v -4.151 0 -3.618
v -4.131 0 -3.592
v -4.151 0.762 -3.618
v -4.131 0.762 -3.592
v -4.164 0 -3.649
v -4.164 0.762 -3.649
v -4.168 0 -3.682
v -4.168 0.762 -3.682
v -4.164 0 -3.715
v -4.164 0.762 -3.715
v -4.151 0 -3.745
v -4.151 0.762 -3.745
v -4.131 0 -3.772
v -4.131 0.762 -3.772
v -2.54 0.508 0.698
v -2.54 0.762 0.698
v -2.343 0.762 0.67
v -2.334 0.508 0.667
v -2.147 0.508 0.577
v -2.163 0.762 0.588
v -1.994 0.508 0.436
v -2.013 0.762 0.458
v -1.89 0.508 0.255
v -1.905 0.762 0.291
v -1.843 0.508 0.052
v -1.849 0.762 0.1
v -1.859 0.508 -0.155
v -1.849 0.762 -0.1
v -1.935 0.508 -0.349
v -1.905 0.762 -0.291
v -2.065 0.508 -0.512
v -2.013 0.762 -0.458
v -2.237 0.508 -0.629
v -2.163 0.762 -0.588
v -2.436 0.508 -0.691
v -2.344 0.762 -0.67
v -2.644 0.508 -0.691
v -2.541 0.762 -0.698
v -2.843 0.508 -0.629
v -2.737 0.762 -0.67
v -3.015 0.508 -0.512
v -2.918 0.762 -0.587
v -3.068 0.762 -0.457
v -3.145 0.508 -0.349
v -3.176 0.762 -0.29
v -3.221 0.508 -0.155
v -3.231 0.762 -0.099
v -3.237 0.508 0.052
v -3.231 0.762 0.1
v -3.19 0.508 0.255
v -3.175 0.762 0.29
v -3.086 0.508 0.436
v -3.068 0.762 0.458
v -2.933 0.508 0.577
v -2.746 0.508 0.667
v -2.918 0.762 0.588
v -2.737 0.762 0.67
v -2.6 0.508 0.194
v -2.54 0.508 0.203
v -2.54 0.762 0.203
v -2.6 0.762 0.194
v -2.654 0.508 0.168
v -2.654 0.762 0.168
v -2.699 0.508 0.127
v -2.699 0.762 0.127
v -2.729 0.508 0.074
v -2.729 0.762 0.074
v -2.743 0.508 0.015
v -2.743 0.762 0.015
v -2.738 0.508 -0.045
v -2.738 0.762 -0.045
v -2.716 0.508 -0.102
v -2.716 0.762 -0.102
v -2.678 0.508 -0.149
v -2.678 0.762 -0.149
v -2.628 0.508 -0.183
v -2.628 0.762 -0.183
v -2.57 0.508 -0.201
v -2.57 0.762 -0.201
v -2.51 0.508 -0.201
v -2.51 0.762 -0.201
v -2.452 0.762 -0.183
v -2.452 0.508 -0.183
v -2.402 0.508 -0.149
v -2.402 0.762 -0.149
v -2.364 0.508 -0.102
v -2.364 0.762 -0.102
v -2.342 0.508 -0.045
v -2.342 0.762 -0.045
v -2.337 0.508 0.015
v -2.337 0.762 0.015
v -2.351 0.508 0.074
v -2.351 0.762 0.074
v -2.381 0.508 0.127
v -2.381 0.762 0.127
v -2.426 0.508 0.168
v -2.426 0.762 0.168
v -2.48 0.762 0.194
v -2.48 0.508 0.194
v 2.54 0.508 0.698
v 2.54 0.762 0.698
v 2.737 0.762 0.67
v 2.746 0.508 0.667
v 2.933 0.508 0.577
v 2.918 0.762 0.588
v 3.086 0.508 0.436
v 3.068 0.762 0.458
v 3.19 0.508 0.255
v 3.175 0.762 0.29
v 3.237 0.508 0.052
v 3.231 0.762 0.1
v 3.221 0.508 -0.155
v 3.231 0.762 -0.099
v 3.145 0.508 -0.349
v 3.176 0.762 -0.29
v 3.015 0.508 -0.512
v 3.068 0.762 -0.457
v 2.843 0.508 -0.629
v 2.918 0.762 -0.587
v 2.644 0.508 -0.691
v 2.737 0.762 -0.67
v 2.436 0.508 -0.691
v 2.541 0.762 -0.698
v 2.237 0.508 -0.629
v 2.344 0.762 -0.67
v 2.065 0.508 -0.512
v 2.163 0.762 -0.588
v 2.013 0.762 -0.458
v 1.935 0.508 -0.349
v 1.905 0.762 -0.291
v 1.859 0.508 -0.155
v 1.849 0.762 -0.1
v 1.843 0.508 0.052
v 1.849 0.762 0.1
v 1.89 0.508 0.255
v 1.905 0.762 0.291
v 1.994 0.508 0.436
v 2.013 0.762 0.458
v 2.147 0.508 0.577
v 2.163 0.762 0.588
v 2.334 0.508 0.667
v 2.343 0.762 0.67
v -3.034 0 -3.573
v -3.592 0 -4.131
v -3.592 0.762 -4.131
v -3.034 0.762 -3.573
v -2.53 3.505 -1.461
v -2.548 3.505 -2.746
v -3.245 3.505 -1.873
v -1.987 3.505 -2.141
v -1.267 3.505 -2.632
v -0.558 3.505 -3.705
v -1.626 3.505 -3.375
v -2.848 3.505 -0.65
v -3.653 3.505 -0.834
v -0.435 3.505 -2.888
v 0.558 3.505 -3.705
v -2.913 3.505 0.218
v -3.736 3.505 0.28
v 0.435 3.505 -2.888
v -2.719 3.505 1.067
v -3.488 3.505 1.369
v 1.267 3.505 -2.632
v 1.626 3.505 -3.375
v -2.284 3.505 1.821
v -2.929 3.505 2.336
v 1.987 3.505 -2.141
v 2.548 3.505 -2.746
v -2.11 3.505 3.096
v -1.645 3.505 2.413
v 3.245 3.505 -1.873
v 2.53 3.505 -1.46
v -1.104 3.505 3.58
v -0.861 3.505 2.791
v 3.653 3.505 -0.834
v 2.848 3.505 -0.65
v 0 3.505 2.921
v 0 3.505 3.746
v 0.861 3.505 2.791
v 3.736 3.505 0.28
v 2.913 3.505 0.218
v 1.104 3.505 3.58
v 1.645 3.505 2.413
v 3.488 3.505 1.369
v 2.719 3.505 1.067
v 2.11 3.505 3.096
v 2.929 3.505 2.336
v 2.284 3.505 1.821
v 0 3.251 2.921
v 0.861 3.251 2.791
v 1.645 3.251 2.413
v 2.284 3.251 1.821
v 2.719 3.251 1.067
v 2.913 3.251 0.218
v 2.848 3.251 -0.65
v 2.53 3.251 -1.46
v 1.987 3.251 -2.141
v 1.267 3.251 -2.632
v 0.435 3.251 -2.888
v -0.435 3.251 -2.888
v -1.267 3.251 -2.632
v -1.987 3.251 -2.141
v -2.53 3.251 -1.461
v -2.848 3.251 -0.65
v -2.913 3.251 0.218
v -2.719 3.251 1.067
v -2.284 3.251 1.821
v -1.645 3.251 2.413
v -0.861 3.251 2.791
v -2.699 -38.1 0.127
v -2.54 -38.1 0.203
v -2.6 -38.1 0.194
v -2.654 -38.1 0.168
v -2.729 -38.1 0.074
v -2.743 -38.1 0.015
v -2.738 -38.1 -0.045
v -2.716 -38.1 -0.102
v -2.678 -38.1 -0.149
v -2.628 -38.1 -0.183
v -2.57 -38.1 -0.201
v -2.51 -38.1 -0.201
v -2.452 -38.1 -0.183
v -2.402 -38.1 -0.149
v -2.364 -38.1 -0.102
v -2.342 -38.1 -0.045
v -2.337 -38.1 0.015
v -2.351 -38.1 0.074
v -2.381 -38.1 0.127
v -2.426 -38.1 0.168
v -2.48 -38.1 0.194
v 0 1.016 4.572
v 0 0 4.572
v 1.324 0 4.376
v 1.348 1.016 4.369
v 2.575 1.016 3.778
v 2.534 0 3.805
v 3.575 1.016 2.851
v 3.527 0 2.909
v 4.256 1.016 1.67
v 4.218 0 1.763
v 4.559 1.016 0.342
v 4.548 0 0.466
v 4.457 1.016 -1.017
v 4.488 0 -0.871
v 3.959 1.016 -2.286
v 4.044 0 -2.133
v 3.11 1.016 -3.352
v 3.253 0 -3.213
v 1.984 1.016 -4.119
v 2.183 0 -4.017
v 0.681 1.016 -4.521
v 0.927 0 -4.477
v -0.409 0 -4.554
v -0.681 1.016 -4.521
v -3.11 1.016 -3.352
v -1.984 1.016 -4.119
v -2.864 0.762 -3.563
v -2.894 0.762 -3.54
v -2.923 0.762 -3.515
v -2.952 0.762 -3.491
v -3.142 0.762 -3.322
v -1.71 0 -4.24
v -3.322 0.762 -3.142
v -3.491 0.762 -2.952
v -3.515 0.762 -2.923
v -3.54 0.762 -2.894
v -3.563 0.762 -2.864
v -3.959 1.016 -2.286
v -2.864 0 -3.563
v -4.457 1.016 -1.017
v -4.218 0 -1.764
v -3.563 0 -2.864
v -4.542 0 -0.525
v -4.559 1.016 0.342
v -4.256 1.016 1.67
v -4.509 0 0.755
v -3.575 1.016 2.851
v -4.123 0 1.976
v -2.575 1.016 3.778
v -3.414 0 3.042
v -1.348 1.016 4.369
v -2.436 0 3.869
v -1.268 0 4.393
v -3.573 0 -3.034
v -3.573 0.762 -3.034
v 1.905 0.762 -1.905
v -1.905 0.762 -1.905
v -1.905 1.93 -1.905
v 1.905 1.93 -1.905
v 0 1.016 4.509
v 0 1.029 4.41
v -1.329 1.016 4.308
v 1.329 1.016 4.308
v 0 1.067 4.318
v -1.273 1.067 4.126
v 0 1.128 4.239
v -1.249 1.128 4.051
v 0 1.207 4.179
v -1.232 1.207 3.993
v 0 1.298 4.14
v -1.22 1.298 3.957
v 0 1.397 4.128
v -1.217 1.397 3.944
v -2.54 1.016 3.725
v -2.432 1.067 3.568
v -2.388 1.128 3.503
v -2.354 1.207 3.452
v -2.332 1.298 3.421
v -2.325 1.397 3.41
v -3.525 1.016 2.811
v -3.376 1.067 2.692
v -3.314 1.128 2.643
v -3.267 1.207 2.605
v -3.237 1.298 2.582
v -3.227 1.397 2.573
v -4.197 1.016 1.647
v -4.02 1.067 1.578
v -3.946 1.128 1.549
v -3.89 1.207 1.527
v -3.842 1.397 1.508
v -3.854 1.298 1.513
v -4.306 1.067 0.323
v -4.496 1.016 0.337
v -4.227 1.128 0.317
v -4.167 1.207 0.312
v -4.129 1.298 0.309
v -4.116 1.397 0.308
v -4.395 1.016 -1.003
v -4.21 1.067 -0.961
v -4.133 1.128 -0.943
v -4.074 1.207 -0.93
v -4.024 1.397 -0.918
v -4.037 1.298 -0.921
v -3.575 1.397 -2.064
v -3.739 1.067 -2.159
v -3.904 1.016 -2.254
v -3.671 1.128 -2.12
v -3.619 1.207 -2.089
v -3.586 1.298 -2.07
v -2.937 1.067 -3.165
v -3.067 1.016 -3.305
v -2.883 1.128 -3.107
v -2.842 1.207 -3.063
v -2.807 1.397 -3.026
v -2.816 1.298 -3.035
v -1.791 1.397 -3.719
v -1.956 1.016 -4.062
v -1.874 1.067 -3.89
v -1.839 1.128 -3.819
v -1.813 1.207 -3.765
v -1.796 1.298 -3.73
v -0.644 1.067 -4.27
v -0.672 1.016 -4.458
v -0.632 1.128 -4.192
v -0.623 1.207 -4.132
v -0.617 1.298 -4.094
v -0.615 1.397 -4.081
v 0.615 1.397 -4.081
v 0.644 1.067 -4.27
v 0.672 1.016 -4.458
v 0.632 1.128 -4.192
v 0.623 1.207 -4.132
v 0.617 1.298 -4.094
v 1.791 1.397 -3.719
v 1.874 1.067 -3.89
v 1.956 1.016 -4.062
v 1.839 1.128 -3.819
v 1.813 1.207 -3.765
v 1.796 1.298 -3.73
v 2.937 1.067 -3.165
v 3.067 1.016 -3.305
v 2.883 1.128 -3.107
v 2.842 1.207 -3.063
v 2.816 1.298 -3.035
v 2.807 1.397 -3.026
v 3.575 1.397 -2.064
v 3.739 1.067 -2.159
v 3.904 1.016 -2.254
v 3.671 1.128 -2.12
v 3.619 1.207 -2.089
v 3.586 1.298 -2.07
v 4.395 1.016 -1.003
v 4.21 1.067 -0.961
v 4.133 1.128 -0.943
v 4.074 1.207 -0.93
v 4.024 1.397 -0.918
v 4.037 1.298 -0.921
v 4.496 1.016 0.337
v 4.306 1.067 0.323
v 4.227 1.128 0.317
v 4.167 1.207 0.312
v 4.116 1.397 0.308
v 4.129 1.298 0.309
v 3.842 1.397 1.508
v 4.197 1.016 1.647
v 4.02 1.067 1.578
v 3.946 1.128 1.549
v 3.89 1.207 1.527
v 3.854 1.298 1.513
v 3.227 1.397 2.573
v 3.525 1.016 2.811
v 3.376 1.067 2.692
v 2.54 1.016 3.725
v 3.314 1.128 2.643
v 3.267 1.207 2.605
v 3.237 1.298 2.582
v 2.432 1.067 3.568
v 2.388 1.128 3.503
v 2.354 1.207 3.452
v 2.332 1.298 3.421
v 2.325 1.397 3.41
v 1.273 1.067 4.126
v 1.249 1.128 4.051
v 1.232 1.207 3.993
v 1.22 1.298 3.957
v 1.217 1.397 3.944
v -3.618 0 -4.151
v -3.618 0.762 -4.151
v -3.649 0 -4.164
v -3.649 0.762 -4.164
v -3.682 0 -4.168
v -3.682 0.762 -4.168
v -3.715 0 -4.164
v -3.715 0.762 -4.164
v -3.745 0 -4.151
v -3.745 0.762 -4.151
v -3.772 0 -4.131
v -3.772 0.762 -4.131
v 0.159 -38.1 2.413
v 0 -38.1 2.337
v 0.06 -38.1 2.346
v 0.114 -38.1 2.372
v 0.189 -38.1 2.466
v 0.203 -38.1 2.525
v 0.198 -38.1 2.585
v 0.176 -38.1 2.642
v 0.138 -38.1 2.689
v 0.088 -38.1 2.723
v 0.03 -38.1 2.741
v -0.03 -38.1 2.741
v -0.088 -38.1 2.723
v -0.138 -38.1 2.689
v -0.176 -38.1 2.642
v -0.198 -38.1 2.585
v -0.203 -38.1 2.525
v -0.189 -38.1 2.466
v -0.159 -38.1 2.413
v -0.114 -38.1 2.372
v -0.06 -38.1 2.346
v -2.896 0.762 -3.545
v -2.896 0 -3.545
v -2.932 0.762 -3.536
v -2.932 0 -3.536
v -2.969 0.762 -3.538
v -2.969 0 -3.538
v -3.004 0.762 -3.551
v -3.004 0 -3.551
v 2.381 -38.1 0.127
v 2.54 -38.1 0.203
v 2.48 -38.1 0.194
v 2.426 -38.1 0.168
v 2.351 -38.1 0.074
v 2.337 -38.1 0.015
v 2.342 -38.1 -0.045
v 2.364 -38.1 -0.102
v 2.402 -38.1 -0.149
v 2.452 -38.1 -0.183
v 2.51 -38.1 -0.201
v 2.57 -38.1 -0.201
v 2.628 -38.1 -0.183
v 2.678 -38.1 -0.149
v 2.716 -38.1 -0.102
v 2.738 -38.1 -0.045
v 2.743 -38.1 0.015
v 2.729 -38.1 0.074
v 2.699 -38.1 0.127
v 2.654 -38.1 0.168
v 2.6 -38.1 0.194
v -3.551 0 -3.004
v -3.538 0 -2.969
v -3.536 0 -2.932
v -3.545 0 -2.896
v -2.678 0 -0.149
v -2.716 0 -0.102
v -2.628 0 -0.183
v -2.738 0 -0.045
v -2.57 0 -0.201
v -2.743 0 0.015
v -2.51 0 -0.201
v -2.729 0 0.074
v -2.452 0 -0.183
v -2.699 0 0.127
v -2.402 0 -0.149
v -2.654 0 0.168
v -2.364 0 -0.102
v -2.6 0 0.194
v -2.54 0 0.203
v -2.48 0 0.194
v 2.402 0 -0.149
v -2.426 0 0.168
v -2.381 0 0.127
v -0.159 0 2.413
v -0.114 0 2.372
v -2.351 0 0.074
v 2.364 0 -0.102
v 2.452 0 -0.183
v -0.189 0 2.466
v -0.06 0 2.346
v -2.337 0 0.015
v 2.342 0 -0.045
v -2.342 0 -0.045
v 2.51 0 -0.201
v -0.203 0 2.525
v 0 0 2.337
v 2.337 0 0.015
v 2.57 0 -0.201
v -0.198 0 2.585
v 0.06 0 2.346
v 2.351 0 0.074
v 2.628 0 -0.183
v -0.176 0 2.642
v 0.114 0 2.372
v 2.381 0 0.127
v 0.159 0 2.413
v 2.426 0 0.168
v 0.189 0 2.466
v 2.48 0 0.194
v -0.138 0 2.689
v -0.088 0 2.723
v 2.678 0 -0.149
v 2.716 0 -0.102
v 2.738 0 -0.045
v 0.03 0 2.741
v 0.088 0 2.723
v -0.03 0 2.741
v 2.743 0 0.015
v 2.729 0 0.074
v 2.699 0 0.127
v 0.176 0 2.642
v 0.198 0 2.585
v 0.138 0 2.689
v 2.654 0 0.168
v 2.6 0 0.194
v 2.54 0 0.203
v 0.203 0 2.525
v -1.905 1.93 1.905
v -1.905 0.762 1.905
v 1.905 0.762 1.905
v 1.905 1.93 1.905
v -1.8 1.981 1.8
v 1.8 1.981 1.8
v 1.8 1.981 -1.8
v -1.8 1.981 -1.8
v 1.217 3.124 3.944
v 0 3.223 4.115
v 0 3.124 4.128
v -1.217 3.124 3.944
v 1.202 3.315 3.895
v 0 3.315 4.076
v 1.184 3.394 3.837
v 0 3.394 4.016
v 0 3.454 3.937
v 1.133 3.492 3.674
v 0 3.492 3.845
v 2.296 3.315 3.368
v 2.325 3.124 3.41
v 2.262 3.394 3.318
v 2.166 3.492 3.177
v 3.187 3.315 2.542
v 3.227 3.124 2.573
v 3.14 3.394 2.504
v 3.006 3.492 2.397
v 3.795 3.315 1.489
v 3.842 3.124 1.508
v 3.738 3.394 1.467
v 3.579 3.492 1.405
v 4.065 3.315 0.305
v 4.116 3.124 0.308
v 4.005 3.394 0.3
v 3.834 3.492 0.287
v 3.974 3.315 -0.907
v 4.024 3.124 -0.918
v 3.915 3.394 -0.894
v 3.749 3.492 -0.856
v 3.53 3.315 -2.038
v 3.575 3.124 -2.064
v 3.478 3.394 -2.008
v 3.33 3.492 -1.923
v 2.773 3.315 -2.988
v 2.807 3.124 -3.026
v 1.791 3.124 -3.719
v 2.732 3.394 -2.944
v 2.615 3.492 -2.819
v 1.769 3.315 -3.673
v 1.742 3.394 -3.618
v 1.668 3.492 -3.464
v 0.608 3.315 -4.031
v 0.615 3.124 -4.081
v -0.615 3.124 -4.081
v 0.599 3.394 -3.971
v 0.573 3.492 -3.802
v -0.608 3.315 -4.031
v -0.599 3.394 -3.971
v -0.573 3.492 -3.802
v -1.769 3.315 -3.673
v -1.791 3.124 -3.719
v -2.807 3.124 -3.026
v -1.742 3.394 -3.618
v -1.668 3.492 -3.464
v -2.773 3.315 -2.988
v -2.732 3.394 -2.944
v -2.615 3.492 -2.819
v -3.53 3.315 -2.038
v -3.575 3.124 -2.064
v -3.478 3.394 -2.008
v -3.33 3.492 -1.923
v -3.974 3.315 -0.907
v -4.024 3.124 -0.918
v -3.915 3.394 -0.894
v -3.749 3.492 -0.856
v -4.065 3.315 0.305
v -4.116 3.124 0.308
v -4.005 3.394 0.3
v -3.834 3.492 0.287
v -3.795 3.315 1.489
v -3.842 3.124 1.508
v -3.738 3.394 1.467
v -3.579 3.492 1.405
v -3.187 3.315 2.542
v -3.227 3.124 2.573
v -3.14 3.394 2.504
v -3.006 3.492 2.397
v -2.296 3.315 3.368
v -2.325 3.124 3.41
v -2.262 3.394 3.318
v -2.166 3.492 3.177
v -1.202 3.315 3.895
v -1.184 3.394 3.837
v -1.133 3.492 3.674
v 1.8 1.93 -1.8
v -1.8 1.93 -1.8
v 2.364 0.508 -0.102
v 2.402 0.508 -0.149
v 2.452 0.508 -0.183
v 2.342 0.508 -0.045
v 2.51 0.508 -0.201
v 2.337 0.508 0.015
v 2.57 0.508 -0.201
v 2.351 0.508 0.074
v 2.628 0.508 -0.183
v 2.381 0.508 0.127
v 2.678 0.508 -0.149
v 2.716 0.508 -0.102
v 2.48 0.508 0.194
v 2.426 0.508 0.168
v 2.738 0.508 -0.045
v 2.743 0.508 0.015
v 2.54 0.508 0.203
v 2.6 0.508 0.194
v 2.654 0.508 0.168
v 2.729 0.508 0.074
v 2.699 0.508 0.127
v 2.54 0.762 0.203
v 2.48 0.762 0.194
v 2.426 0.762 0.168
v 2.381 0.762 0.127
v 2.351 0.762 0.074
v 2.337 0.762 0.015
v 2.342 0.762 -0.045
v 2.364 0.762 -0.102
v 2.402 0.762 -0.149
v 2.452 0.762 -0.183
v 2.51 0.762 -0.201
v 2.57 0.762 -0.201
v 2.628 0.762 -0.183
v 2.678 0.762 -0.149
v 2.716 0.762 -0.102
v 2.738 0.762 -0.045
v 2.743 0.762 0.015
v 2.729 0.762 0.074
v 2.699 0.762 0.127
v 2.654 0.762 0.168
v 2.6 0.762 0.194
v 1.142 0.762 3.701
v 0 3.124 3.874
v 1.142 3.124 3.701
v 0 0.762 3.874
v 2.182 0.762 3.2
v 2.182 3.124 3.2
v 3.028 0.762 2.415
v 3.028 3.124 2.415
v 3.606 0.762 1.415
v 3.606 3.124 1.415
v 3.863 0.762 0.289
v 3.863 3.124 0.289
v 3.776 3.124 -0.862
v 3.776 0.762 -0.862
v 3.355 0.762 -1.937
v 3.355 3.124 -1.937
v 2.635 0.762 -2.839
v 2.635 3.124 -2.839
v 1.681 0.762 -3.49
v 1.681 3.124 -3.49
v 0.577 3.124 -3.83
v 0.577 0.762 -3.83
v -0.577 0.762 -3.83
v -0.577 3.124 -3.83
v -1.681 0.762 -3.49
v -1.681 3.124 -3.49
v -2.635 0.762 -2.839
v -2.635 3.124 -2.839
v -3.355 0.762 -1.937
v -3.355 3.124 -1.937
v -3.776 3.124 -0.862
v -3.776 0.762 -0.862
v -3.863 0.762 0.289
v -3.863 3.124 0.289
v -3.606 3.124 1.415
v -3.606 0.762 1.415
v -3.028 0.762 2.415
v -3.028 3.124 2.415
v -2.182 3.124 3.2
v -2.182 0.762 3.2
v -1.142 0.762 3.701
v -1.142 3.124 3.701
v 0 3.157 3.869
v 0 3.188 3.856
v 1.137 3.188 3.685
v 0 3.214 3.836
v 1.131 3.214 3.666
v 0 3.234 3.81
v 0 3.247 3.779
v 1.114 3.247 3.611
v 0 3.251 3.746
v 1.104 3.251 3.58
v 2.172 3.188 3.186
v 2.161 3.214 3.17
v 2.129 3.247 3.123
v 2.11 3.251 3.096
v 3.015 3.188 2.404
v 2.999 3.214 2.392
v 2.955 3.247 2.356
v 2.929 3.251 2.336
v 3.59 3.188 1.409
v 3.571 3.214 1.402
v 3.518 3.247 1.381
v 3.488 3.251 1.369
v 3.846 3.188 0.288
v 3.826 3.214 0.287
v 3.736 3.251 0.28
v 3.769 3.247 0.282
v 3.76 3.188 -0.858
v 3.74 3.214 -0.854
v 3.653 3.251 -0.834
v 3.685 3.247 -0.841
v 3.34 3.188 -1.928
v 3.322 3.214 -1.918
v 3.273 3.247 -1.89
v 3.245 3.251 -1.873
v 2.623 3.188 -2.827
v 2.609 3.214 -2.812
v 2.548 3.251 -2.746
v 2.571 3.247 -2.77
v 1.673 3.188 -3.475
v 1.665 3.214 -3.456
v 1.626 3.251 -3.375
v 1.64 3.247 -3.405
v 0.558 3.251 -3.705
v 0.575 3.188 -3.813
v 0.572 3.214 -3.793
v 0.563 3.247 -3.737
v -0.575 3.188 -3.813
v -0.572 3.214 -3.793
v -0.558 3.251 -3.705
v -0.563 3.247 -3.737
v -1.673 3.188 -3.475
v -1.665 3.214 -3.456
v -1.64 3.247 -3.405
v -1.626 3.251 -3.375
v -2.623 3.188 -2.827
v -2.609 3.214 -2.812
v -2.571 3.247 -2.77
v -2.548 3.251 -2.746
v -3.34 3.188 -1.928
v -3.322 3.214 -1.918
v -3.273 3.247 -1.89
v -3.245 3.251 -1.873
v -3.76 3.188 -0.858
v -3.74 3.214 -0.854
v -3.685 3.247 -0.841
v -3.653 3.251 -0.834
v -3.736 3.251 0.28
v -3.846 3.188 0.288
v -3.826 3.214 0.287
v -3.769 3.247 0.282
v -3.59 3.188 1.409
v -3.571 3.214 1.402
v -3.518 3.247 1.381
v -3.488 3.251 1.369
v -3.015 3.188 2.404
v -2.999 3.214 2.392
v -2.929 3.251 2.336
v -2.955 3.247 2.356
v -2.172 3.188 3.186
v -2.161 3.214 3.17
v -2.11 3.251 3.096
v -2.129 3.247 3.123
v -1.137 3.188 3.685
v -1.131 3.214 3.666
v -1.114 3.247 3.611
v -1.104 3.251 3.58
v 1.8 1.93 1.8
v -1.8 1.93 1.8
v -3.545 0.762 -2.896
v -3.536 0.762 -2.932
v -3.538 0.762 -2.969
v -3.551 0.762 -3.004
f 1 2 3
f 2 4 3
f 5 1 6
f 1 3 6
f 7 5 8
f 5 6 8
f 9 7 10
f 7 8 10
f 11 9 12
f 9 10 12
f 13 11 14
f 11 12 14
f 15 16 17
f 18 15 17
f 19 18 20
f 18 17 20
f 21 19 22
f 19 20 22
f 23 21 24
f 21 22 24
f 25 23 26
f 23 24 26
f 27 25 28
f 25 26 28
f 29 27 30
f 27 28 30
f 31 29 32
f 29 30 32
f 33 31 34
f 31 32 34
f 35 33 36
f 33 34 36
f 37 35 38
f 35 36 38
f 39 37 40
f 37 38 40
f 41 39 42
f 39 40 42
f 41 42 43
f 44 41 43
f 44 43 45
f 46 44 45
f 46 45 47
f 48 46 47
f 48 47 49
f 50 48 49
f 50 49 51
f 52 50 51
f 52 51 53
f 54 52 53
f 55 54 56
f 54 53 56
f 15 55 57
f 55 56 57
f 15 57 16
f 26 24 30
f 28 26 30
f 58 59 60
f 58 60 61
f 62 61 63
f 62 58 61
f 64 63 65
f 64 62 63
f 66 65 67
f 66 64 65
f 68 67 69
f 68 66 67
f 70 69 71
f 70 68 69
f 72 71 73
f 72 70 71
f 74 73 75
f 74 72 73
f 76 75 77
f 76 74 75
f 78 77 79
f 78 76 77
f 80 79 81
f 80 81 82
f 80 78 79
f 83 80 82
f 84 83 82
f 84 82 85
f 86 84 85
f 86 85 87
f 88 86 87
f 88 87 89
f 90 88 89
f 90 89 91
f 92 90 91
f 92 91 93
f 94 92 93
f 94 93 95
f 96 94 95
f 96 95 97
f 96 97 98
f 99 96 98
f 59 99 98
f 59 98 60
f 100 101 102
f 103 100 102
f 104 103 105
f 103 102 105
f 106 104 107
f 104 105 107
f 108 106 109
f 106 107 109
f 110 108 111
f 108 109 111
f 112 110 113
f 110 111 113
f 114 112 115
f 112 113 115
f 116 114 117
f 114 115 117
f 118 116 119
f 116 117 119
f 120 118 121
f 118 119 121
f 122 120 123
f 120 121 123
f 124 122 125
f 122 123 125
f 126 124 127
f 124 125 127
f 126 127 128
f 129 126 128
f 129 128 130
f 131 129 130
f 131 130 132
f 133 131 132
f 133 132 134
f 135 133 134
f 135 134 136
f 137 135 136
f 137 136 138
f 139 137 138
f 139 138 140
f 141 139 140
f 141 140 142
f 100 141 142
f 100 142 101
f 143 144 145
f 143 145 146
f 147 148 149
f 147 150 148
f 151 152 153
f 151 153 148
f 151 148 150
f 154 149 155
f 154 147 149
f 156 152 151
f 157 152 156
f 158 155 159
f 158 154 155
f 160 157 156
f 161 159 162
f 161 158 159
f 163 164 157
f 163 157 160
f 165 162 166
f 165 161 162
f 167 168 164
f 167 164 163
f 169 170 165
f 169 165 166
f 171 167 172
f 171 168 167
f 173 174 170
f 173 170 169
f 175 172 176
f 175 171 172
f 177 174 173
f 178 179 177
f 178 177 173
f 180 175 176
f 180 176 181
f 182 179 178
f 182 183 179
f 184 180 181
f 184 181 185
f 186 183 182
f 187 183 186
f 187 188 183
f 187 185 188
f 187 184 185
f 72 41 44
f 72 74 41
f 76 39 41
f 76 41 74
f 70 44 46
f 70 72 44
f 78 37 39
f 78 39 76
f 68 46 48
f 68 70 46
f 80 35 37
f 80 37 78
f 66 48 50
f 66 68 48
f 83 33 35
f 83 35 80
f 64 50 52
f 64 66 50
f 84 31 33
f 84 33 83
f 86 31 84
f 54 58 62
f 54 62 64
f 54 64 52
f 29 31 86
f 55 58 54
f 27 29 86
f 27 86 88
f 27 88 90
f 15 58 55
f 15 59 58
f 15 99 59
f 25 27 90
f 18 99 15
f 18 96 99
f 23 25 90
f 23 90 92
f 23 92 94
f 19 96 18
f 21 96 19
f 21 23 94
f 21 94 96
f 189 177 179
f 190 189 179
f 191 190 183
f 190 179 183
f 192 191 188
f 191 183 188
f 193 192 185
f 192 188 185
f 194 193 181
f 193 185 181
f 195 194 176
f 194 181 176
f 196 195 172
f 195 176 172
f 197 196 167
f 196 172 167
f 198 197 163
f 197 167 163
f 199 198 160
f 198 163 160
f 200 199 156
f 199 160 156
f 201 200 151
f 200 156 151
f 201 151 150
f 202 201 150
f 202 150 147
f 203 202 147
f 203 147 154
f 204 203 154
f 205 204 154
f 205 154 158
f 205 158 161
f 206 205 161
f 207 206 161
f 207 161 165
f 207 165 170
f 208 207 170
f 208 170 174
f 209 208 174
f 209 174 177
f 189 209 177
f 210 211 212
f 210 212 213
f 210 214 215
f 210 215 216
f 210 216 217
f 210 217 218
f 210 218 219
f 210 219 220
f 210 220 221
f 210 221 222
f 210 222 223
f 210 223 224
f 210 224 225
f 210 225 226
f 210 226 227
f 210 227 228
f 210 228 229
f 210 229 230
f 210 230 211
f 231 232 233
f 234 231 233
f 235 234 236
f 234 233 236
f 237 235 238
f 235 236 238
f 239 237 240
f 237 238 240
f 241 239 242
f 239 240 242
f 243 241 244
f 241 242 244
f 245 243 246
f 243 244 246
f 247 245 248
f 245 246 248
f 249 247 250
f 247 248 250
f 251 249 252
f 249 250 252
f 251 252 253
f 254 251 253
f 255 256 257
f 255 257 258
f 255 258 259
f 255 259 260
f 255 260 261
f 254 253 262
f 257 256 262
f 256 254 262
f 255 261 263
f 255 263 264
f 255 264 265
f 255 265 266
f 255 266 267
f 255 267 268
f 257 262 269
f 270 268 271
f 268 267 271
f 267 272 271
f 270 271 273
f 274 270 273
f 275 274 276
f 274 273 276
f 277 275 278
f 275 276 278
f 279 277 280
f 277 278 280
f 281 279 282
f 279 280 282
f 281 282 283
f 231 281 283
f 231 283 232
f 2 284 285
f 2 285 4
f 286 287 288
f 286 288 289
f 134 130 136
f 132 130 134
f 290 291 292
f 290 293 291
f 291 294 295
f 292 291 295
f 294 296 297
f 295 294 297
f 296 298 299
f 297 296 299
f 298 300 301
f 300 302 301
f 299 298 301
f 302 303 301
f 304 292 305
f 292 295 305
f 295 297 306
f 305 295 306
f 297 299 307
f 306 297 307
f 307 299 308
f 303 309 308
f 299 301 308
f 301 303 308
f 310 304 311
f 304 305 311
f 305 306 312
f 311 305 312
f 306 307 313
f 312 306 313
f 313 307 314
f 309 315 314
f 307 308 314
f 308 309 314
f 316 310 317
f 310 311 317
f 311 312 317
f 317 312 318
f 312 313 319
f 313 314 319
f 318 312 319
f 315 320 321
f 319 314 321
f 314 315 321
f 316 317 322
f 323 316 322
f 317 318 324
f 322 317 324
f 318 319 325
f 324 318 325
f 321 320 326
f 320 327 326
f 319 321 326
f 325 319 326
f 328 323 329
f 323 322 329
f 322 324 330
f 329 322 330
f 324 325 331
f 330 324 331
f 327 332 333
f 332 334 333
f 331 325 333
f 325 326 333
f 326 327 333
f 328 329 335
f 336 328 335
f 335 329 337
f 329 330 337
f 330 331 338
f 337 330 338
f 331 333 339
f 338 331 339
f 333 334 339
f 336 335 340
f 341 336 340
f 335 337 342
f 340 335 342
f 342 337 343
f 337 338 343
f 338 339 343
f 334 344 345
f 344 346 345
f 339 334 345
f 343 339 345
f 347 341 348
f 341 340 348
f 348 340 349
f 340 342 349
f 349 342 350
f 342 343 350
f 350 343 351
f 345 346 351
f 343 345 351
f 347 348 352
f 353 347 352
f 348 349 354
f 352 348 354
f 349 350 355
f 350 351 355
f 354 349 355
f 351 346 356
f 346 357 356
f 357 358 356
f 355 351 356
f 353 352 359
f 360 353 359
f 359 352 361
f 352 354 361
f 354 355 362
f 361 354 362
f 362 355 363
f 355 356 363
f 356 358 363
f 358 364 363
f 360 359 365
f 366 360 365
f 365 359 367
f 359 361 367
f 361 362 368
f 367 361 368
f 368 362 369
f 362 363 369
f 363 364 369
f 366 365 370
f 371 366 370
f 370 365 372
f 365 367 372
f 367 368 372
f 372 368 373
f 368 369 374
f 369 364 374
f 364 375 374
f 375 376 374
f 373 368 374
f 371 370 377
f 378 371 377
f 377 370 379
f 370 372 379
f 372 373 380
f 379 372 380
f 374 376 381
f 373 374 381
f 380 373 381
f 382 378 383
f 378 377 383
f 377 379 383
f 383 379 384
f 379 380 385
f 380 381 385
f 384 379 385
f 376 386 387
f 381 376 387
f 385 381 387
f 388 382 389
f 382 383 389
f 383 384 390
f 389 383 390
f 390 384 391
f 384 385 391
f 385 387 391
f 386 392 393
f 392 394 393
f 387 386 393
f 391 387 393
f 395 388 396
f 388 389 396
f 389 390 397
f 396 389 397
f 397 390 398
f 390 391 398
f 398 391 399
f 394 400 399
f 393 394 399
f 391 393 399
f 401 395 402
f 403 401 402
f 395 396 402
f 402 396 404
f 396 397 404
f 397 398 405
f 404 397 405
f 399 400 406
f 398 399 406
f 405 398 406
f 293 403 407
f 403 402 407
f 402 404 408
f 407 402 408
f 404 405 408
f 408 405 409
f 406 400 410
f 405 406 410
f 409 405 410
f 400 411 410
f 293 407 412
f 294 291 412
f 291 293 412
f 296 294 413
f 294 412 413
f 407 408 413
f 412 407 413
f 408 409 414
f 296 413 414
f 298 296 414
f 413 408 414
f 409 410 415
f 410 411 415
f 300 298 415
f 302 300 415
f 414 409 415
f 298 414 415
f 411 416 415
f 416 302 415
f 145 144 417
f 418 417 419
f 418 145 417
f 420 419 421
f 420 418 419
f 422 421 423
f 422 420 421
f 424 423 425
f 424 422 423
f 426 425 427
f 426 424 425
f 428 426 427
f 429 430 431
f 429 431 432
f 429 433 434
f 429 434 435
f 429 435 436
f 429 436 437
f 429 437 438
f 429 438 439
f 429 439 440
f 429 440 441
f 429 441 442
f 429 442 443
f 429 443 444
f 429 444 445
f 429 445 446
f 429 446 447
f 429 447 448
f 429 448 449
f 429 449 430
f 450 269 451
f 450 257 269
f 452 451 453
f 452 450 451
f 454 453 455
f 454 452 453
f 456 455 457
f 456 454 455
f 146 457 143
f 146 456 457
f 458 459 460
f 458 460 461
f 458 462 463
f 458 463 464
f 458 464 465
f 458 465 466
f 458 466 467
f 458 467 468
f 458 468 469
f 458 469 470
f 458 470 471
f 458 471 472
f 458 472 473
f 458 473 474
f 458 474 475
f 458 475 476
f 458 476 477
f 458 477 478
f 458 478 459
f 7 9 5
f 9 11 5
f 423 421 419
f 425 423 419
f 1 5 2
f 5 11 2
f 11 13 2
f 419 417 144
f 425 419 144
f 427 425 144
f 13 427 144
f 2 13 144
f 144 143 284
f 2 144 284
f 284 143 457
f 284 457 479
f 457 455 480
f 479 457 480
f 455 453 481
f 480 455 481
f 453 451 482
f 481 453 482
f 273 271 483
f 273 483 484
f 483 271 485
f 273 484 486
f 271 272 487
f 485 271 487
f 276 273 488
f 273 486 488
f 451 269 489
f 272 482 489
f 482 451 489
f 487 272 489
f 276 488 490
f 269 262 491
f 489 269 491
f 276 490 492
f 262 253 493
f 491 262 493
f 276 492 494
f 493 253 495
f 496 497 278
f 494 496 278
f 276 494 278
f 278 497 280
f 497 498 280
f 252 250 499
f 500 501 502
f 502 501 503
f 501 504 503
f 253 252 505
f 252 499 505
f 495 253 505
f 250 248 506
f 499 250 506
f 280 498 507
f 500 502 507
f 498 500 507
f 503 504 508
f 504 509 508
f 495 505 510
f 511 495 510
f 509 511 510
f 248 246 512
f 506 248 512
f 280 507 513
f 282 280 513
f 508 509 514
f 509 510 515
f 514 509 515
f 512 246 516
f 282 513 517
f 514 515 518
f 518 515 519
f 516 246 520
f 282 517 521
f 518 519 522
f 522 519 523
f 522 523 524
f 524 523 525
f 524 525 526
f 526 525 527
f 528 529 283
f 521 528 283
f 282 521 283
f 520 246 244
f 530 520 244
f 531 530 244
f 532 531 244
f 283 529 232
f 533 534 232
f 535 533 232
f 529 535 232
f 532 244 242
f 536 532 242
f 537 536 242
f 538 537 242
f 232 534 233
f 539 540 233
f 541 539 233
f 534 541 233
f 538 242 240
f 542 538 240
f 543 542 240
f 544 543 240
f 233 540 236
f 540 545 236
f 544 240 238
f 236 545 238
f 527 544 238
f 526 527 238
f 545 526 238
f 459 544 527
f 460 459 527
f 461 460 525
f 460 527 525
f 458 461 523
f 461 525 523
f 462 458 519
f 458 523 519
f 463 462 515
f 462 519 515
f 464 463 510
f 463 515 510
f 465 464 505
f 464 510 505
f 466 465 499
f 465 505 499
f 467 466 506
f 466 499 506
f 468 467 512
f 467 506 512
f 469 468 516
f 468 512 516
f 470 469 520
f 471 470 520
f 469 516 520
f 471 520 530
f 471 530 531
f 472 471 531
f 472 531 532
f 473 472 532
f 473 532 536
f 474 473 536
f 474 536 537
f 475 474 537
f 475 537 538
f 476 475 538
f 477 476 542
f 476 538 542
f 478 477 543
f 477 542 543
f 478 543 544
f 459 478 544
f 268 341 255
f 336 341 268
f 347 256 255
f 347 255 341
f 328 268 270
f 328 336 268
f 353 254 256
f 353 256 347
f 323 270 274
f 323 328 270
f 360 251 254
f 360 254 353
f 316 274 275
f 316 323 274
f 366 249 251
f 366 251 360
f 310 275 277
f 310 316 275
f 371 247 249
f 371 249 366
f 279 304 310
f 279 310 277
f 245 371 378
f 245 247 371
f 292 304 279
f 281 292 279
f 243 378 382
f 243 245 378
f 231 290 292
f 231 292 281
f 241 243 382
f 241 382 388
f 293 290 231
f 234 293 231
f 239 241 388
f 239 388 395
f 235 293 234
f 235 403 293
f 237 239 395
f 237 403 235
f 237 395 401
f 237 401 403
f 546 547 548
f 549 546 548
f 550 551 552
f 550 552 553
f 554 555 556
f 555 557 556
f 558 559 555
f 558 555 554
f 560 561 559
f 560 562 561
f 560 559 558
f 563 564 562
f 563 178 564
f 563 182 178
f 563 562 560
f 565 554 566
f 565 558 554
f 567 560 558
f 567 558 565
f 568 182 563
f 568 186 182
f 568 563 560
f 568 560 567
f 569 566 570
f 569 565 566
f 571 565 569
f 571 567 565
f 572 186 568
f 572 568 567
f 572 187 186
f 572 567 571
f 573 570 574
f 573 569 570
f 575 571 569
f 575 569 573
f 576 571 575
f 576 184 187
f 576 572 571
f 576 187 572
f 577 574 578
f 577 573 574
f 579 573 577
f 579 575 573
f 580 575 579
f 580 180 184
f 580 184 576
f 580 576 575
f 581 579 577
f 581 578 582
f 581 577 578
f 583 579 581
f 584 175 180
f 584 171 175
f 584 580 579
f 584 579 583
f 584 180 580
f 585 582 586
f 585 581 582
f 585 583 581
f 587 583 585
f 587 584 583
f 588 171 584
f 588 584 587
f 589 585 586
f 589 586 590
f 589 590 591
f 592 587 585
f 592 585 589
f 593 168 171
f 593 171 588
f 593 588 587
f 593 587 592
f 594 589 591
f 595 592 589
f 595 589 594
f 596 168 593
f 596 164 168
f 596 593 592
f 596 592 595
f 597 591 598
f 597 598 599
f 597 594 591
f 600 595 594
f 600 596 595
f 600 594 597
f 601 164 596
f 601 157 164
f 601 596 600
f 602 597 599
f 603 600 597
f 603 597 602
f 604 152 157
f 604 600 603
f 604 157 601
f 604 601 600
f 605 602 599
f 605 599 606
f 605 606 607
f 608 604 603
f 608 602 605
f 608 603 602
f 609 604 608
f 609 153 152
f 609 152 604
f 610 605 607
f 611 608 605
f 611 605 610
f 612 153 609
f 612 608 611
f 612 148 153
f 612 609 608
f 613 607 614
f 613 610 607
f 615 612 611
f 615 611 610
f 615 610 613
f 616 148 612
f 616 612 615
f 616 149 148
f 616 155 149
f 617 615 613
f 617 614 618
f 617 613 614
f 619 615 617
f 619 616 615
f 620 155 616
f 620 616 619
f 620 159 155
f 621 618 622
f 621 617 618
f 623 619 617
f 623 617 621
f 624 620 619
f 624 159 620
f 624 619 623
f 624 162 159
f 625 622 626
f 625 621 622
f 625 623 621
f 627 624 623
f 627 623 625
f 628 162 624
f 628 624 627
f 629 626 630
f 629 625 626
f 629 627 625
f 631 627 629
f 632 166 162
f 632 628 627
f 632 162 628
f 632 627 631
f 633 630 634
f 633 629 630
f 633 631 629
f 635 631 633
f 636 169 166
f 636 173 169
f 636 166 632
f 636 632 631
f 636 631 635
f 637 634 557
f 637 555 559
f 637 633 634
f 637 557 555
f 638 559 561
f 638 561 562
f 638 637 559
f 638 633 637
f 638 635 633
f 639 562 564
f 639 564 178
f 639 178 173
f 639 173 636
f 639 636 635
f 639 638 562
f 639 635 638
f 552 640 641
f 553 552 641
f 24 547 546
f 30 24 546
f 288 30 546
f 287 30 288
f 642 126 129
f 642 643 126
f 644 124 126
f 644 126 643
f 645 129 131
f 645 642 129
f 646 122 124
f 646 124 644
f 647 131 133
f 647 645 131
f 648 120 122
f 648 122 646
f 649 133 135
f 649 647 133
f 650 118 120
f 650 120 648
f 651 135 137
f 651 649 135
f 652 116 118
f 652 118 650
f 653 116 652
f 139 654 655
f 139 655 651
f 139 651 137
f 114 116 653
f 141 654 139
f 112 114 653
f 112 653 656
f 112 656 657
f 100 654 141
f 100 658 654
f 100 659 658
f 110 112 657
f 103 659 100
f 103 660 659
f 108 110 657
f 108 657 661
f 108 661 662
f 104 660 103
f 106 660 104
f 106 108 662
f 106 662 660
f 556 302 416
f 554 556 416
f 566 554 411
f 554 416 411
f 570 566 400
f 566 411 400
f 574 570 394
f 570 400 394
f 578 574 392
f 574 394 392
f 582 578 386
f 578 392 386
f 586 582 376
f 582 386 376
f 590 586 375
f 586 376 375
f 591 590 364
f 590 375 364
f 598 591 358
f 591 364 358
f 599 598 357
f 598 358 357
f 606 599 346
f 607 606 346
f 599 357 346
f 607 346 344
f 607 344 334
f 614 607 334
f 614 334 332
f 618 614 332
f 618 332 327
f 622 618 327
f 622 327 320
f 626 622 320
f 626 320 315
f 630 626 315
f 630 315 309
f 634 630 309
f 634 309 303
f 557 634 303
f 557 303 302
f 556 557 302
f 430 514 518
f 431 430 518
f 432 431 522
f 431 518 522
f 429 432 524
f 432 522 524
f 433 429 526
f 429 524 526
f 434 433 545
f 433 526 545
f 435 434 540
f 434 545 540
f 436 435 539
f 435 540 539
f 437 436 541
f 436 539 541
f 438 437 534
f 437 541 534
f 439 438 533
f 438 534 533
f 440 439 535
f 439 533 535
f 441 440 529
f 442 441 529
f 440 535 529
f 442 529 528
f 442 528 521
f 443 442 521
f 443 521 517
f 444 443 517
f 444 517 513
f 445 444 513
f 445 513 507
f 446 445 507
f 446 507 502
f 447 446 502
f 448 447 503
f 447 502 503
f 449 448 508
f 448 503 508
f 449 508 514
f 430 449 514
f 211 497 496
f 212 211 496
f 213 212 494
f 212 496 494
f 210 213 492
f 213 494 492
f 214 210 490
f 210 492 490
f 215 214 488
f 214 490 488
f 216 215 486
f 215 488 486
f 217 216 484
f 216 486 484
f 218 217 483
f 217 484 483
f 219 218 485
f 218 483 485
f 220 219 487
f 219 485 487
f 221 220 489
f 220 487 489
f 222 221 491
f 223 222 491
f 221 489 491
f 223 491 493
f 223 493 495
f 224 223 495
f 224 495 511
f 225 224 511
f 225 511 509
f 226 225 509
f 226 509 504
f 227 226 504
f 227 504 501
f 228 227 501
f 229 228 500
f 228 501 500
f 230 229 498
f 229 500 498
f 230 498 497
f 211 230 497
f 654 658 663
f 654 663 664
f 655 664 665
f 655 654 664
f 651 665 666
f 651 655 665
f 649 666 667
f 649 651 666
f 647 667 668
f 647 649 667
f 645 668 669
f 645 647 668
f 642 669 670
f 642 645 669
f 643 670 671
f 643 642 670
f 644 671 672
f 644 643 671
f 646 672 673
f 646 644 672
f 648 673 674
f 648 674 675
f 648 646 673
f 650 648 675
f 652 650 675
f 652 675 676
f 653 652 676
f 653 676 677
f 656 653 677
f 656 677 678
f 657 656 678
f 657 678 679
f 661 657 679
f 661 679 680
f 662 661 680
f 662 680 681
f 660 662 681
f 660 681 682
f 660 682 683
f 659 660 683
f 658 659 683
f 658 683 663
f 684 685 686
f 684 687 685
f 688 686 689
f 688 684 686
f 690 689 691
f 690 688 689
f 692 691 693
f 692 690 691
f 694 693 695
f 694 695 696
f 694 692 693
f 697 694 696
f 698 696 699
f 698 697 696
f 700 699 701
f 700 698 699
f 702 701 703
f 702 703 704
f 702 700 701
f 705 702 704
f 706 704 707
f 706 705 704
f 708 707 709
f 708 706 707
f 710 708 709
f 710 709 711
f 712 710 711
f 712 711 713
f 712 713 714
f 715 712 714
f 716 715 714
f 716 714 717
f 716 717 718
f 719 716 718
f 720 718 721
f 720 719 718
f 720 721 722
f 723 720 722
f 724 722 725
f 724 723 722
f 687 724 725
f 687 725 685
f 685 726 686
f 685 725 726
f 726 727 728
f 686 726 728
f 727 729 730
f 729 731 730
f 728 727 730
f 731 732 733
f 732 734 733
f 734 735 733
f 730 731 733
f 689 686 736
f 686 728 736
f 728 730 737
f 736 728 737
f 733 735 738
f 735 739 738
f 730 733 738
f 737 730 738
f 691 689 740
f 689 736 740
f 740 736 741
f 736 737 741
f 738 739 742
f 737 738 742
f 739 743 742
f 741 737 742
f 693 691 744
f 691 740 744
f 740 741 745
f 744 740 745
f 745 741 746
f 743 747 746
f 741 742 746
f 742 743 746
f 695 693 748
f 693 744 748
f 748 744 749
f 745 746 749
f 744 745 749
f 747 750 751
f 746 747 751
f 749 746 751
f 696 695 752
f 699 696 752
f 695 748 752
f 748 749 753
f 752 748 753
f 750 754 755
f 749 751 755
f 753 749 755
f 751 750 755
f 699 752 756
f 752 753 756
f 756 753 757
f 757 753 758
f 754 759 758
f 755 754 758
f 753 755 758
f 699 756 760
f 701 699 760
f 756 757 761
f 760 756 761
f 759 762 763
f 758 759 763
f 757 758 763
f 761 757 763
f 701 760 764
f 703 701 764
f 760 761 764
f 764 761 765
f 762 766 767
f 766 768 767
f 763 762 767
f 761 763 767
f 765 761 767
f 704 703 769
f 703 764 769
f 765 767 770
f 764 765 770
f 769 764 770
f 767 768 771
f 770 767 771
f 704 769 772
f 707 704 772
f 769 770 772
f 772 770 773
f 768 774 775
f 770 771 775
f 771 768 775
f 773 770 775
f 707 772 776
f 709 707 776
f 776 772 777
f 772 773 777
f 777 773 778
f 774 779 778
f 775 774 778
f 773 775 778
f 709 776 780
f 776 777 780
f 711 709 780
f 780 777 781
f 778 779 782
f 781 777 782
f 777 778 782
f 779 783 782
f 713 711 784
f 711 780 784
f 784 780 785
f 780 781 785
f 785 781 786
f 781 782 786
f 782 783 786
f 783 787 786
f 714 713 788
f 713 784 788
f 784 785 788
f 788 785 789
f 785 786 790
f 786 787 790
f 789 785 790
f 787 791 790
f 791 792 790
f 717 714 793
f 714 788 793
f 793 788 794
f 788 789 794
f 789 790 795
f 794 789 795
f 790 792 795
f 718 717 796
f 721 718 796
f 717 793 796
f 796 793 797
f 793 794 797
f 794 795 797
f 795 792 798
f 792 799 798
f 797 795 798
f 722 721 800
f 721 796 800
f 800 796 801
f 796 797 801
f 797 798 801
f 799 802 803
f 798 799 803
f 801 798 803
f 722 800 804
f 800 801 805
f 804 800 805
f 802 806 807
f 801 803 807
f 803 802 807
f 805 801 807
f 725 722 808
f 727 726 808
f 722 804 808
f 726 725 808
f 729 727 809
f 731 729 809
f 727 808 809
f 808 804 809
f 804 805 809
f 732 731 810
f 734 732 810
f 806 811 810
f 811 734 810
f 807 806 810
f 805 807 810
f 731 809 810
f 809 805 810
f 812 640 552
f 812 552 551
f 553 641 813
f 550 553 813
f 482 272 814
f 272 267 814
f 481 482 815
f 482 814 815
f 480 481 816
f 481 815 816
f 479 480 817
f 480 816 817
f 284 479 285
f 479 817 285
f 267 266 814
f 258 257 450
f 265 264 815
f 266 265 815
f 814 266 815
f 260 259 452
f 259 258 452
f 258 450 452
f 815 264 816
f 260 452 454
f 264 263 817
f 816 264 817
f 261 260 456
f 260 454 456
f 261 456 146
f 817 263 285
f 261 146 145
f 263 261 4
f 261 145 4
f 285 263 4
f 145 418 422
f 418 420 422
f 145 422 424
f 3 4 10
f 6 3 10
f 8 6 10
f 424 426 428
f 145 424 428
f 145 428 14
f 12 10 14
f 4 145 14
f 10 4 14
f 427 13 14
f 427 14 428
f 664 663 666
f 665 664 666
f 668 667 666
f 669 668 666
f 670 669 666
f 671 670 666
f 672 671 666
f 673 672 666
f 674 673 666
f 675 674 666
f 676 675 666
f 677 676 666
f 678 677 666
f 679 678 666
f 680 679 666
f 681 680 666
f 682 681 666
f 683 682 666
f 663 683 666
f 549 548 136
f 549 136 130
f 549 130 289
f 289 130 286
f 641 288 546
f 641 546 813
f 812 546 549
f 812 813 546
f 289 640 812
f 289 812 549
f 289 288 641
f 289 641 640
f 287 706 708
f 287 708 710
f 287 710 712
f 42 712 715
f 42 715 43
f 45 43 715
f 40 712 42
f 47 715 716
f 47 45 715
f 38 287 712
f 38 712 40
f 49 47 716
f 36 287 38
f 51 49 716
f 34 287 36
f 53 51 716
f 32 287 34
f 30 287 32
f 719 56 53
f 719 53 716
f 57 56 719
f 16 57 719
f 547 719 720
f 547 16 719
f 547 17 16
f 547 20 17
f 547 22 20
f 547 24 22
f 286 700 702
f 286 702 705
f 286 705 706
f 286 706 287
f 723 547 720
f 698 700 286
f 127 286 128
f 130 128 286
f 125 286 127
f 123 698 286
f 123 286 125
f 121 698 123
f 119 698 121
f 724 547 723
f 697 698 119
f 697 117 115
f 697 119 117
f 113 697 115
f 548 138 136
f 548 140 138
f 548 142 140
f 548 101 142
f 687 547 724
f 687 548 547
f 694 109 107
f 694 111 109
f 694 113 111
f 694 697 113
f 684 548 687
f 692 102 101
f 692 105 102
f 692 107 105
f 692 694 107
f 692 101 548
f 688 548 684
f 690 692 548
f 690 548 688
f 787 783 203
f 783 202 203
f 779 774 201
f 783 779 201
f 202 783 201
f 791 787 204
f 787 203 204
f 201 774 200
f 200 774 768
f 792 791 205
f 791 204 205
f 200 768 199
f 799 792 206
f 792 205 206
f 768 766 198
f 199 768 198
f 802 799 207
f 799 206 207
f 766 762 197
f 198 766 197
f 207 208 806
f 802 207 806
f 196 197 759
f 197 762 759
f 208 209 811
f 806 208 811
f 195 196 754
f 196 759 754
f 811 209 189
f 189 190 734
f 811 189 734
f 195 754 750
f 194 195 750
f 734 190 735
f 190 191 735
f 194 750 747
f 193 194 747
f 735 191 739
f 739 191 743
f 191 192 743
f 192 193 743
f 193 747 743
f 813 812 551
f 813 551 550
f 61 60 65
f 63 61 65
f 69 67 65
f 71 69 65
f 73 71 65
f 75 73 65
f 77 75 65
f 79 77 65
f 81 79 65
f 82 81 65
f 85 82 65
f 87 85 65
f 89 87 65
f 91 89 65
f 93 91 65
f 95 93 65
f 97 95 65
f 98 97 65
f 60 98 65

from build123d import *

# Parameters (mm, degrees)
SKETCH1_R                 = 4.1275
BODY_EXTRUDE_DEPTH        = 3.5052
FILLET1_R                 = 0.381
SHELL1_T                  = -0.254
SKETCH2_R                 = 4.572
FLANGE_EXTRUDE_DEPTH      = 1.016
FLANGE_FILLET_R           = 0.381
SKETCH4_R                 = 3.8735
FLANGE_DEPTH_CUTOUT_DEPTH = 0.254
WINDOW_CUTOUT_REACH       = 5.505
SKETCH3_R                 = 2.921
SKETCH6_R                 = 0.6985
PIN_RECESS_DEPTH          = 0.254
SKETCH10_W                = 3.81
SKETCH10_H                = 3.81
BOSS_EXTRUDE1_DEPTH       = 1.1684
SKETCH5_W                 = 3.5999928
SKETCH5_H                 = 3.5999928
DETECTOR_EXTRUDE_DEPTH    = 0.0508
TAB_EXTRUDE_DEPTH         = 0.762
TAB_FILLETS_R             = 0.127
SKETCH8_3_R               = 0.2032
EXTRUDE1_DEPTH            = 38.1
EXTRUDE1_DEPTH_BACK       = 0.762


with BuildPart() as part:
    # Sketch1 → Body Extrude (new body)
    with BuildSketch(Plane(origin=(0, 0, 0), x_dir=(1, 0, 0), z_dir=(0, 1, 0))):
        with Locations(Location((0, 0, 0), (0, 0, 270))):  # turned: the seam where the file's is
            Circle(SKETCH1_R)
    extrude(amount=BODY_EXTRUDE_DEPTH)

    # Fillet1
    fillet1_edges = [part.edges().sort_by_distance(p)[0] for p in [
        (0, 3.5052, -4.1275),
    ]]
    fillet(fillet1_edges, radius=FILLET1_R)

    # Shell1
    shell1_openings = [part.faces().sort_by_distance(p)[0] for p in [
        (0, 0, 0),
    ]]
    offset(amount=SHELL1_T, openings=shell1_openings, kind=Kind.INTERSECTION)

    # Sketch2 → Flange Extrude (add)
    with BuildSketch(Plane(origin=(0, 0, 0), x_dir=(1, 0, 0), z_dir=(0, 1, 0))):
        with Locations(Location((0, 0, 0), (0, 0, 270))):  # turned: the seam where the file's is
            Circle(SKETCH2_R)
    extrude(amount=FLANGE_EXTRUDE_DEPTH)

    # Flange Fillet
    flange_fillet_edges = [part.edges().sort_by_distance(p)[0] for p in [
        (0, 1.016, -4.1275),
    ]]
    fillet(flange_fillet_edges, radius=FLANGE_FILLET_R)

    # Sketch4 → Flange Depth Cutout (cut)
    with BuildSketch(Plane(origin=(0, 1.016, 0), x_dir=(-1, 0, 0), z_dir=(0, 1, 0))):
        with Locations(Location((0, 0, 0), (0, 0, 90))):  # turned: the seam where the file's is
            Circle(SKETCH4_R)
    extrude(amount=-FLANGE_DEPTH_CUTOUT_DEPTH, mode=Mode.SUBTRACT)

    # Sketch3 → Window Cutout (cut, up to next)
    with BuildSketch(Plane(origin=(0, 3.5052, 0), x_dir=(-1, 0, 0), z_dir=(0, 1, 0)), mode=Mode.PRIVATE) as window_cutout_sk1:
        with Locations(Location((0, 0, 0), (0, 0, 90))):  # turned: the seam where the file's is
            Circle(SKETCH3_R)
    window_cutout_tool1 = extrude(window_cutout_sk1.sketch, amount=-WINDOW_CUTOUT_REACH, mode=Mode.PRIVATE) & part.part
    add(window_cutout_tool1.solids().sort_by_distance((0, 3.5052, 0))[0], mode=Mode.SUBTRACT)

    # Sketch6 → Pin Recess (cut)
    with BuildSketch(Plane(origin=(0, 0.762, 0), x_dir=(-1, 0, 0), z_dir=(0, 1, 0))):
        with Locations(Location((-2.54, 0, 0), (0, 0, 90))):  # turned: the seam where the file's is
            Circle(SKETCH6_R)
        with Locations(Location((2.54, 0, 0), (0, 0, 90))):  # turned: the seam where the file's is
            Circle(SKETCH6_R)
    extrude(amount=-PIN_RECESS_DEPTH, mode=Mode.SUBTRACT)

    # Sketch10 → Boss-Extrude1 (add)
    with BuildSketch(Plane(origin=(0, 0.762, 0), x_dir=(1, 0, 0), z_dir=(0, 1, 0))):
        Rectangle(SKETCH10_W, SKETCH10_H)
    extrude(amount=BOSS_EXTRUDE1_DEPTH)

    # Sketch5 → Detector Extrude (add)
    with BuildSketch(Plane(origin=(0, 1.9304, 0), x_dir=(-1, 0, 0), z_dir=(0, 1, 0))):
        Rectangle(SKETCH5_W, SKETCH5_H)
    extrude(amount=DETECTOR_EXTRUDE_DEPTH)

    # Sketch7 → Tab Extrude (add)
    with BuildSketch(Plane(origin=(0, 0, 0), x_dir=(1, 0, 0), z_dir=(0, 1, 0))):
        with BuildLine():
            Line((-3.491055011, 2.952239643), (-4.220720377, 3.68190501))
            Line((-4.220720377, 3.68190501), (-3.68190501, 4.220720377))
            Line((-3.68190501, 4.220720377), (-2.952239643, 3.491055011))
            ThreePointArc((-2.952239643, 3.491055011), (-3.232892204, 3.232892204), (-3.491055011, 2.952239643))
        make_face()
    extrude(amount=TAB_EXTRUDE_DEPTH)

    # Tab Fillets
    tab_fillets_edges = [part.edges().sort_by_distance(p)[0] for p in [
        (-3.491055011, 0.381, -2.952239643),
        (-2.952239643, 0.381, -3.491055011),
        (-3.68190501, 0.381, -4.220720377),
        (-4.220720377, 0.381, -3.68190501),
    ]]
    fillet(tab_fillets_edges, radius=TAB_FILLETS_R)

    # Sketch8_3 → Extrude1 (add, two sides)
    with BuildSketch(Plane.XZ) as extrude1_sk:
        with Locations(Location((2.54, 0, 0), (0, 0, 90))):  # turned: the seam where the file's is
            Circle(SKETCH8_3_R)
        with Locations(Location((0, 2.54, 0), (0, 0, 270))):  # turned: the seam where the file's is
            Circle(SKETCH8_3_R)
        with Locations(Location((-2.54, 0, 0), (0, 0, 90))):  # turned: the seam where the file's is
            Circle(SKETCH8_3_R)
    extrude(amount=EXTRUDE1_DEPTH)
    extrude(extrude1_sk.sketch, amount=-EXTRUDE1_DEPTH_BACK)


solid = part.part
